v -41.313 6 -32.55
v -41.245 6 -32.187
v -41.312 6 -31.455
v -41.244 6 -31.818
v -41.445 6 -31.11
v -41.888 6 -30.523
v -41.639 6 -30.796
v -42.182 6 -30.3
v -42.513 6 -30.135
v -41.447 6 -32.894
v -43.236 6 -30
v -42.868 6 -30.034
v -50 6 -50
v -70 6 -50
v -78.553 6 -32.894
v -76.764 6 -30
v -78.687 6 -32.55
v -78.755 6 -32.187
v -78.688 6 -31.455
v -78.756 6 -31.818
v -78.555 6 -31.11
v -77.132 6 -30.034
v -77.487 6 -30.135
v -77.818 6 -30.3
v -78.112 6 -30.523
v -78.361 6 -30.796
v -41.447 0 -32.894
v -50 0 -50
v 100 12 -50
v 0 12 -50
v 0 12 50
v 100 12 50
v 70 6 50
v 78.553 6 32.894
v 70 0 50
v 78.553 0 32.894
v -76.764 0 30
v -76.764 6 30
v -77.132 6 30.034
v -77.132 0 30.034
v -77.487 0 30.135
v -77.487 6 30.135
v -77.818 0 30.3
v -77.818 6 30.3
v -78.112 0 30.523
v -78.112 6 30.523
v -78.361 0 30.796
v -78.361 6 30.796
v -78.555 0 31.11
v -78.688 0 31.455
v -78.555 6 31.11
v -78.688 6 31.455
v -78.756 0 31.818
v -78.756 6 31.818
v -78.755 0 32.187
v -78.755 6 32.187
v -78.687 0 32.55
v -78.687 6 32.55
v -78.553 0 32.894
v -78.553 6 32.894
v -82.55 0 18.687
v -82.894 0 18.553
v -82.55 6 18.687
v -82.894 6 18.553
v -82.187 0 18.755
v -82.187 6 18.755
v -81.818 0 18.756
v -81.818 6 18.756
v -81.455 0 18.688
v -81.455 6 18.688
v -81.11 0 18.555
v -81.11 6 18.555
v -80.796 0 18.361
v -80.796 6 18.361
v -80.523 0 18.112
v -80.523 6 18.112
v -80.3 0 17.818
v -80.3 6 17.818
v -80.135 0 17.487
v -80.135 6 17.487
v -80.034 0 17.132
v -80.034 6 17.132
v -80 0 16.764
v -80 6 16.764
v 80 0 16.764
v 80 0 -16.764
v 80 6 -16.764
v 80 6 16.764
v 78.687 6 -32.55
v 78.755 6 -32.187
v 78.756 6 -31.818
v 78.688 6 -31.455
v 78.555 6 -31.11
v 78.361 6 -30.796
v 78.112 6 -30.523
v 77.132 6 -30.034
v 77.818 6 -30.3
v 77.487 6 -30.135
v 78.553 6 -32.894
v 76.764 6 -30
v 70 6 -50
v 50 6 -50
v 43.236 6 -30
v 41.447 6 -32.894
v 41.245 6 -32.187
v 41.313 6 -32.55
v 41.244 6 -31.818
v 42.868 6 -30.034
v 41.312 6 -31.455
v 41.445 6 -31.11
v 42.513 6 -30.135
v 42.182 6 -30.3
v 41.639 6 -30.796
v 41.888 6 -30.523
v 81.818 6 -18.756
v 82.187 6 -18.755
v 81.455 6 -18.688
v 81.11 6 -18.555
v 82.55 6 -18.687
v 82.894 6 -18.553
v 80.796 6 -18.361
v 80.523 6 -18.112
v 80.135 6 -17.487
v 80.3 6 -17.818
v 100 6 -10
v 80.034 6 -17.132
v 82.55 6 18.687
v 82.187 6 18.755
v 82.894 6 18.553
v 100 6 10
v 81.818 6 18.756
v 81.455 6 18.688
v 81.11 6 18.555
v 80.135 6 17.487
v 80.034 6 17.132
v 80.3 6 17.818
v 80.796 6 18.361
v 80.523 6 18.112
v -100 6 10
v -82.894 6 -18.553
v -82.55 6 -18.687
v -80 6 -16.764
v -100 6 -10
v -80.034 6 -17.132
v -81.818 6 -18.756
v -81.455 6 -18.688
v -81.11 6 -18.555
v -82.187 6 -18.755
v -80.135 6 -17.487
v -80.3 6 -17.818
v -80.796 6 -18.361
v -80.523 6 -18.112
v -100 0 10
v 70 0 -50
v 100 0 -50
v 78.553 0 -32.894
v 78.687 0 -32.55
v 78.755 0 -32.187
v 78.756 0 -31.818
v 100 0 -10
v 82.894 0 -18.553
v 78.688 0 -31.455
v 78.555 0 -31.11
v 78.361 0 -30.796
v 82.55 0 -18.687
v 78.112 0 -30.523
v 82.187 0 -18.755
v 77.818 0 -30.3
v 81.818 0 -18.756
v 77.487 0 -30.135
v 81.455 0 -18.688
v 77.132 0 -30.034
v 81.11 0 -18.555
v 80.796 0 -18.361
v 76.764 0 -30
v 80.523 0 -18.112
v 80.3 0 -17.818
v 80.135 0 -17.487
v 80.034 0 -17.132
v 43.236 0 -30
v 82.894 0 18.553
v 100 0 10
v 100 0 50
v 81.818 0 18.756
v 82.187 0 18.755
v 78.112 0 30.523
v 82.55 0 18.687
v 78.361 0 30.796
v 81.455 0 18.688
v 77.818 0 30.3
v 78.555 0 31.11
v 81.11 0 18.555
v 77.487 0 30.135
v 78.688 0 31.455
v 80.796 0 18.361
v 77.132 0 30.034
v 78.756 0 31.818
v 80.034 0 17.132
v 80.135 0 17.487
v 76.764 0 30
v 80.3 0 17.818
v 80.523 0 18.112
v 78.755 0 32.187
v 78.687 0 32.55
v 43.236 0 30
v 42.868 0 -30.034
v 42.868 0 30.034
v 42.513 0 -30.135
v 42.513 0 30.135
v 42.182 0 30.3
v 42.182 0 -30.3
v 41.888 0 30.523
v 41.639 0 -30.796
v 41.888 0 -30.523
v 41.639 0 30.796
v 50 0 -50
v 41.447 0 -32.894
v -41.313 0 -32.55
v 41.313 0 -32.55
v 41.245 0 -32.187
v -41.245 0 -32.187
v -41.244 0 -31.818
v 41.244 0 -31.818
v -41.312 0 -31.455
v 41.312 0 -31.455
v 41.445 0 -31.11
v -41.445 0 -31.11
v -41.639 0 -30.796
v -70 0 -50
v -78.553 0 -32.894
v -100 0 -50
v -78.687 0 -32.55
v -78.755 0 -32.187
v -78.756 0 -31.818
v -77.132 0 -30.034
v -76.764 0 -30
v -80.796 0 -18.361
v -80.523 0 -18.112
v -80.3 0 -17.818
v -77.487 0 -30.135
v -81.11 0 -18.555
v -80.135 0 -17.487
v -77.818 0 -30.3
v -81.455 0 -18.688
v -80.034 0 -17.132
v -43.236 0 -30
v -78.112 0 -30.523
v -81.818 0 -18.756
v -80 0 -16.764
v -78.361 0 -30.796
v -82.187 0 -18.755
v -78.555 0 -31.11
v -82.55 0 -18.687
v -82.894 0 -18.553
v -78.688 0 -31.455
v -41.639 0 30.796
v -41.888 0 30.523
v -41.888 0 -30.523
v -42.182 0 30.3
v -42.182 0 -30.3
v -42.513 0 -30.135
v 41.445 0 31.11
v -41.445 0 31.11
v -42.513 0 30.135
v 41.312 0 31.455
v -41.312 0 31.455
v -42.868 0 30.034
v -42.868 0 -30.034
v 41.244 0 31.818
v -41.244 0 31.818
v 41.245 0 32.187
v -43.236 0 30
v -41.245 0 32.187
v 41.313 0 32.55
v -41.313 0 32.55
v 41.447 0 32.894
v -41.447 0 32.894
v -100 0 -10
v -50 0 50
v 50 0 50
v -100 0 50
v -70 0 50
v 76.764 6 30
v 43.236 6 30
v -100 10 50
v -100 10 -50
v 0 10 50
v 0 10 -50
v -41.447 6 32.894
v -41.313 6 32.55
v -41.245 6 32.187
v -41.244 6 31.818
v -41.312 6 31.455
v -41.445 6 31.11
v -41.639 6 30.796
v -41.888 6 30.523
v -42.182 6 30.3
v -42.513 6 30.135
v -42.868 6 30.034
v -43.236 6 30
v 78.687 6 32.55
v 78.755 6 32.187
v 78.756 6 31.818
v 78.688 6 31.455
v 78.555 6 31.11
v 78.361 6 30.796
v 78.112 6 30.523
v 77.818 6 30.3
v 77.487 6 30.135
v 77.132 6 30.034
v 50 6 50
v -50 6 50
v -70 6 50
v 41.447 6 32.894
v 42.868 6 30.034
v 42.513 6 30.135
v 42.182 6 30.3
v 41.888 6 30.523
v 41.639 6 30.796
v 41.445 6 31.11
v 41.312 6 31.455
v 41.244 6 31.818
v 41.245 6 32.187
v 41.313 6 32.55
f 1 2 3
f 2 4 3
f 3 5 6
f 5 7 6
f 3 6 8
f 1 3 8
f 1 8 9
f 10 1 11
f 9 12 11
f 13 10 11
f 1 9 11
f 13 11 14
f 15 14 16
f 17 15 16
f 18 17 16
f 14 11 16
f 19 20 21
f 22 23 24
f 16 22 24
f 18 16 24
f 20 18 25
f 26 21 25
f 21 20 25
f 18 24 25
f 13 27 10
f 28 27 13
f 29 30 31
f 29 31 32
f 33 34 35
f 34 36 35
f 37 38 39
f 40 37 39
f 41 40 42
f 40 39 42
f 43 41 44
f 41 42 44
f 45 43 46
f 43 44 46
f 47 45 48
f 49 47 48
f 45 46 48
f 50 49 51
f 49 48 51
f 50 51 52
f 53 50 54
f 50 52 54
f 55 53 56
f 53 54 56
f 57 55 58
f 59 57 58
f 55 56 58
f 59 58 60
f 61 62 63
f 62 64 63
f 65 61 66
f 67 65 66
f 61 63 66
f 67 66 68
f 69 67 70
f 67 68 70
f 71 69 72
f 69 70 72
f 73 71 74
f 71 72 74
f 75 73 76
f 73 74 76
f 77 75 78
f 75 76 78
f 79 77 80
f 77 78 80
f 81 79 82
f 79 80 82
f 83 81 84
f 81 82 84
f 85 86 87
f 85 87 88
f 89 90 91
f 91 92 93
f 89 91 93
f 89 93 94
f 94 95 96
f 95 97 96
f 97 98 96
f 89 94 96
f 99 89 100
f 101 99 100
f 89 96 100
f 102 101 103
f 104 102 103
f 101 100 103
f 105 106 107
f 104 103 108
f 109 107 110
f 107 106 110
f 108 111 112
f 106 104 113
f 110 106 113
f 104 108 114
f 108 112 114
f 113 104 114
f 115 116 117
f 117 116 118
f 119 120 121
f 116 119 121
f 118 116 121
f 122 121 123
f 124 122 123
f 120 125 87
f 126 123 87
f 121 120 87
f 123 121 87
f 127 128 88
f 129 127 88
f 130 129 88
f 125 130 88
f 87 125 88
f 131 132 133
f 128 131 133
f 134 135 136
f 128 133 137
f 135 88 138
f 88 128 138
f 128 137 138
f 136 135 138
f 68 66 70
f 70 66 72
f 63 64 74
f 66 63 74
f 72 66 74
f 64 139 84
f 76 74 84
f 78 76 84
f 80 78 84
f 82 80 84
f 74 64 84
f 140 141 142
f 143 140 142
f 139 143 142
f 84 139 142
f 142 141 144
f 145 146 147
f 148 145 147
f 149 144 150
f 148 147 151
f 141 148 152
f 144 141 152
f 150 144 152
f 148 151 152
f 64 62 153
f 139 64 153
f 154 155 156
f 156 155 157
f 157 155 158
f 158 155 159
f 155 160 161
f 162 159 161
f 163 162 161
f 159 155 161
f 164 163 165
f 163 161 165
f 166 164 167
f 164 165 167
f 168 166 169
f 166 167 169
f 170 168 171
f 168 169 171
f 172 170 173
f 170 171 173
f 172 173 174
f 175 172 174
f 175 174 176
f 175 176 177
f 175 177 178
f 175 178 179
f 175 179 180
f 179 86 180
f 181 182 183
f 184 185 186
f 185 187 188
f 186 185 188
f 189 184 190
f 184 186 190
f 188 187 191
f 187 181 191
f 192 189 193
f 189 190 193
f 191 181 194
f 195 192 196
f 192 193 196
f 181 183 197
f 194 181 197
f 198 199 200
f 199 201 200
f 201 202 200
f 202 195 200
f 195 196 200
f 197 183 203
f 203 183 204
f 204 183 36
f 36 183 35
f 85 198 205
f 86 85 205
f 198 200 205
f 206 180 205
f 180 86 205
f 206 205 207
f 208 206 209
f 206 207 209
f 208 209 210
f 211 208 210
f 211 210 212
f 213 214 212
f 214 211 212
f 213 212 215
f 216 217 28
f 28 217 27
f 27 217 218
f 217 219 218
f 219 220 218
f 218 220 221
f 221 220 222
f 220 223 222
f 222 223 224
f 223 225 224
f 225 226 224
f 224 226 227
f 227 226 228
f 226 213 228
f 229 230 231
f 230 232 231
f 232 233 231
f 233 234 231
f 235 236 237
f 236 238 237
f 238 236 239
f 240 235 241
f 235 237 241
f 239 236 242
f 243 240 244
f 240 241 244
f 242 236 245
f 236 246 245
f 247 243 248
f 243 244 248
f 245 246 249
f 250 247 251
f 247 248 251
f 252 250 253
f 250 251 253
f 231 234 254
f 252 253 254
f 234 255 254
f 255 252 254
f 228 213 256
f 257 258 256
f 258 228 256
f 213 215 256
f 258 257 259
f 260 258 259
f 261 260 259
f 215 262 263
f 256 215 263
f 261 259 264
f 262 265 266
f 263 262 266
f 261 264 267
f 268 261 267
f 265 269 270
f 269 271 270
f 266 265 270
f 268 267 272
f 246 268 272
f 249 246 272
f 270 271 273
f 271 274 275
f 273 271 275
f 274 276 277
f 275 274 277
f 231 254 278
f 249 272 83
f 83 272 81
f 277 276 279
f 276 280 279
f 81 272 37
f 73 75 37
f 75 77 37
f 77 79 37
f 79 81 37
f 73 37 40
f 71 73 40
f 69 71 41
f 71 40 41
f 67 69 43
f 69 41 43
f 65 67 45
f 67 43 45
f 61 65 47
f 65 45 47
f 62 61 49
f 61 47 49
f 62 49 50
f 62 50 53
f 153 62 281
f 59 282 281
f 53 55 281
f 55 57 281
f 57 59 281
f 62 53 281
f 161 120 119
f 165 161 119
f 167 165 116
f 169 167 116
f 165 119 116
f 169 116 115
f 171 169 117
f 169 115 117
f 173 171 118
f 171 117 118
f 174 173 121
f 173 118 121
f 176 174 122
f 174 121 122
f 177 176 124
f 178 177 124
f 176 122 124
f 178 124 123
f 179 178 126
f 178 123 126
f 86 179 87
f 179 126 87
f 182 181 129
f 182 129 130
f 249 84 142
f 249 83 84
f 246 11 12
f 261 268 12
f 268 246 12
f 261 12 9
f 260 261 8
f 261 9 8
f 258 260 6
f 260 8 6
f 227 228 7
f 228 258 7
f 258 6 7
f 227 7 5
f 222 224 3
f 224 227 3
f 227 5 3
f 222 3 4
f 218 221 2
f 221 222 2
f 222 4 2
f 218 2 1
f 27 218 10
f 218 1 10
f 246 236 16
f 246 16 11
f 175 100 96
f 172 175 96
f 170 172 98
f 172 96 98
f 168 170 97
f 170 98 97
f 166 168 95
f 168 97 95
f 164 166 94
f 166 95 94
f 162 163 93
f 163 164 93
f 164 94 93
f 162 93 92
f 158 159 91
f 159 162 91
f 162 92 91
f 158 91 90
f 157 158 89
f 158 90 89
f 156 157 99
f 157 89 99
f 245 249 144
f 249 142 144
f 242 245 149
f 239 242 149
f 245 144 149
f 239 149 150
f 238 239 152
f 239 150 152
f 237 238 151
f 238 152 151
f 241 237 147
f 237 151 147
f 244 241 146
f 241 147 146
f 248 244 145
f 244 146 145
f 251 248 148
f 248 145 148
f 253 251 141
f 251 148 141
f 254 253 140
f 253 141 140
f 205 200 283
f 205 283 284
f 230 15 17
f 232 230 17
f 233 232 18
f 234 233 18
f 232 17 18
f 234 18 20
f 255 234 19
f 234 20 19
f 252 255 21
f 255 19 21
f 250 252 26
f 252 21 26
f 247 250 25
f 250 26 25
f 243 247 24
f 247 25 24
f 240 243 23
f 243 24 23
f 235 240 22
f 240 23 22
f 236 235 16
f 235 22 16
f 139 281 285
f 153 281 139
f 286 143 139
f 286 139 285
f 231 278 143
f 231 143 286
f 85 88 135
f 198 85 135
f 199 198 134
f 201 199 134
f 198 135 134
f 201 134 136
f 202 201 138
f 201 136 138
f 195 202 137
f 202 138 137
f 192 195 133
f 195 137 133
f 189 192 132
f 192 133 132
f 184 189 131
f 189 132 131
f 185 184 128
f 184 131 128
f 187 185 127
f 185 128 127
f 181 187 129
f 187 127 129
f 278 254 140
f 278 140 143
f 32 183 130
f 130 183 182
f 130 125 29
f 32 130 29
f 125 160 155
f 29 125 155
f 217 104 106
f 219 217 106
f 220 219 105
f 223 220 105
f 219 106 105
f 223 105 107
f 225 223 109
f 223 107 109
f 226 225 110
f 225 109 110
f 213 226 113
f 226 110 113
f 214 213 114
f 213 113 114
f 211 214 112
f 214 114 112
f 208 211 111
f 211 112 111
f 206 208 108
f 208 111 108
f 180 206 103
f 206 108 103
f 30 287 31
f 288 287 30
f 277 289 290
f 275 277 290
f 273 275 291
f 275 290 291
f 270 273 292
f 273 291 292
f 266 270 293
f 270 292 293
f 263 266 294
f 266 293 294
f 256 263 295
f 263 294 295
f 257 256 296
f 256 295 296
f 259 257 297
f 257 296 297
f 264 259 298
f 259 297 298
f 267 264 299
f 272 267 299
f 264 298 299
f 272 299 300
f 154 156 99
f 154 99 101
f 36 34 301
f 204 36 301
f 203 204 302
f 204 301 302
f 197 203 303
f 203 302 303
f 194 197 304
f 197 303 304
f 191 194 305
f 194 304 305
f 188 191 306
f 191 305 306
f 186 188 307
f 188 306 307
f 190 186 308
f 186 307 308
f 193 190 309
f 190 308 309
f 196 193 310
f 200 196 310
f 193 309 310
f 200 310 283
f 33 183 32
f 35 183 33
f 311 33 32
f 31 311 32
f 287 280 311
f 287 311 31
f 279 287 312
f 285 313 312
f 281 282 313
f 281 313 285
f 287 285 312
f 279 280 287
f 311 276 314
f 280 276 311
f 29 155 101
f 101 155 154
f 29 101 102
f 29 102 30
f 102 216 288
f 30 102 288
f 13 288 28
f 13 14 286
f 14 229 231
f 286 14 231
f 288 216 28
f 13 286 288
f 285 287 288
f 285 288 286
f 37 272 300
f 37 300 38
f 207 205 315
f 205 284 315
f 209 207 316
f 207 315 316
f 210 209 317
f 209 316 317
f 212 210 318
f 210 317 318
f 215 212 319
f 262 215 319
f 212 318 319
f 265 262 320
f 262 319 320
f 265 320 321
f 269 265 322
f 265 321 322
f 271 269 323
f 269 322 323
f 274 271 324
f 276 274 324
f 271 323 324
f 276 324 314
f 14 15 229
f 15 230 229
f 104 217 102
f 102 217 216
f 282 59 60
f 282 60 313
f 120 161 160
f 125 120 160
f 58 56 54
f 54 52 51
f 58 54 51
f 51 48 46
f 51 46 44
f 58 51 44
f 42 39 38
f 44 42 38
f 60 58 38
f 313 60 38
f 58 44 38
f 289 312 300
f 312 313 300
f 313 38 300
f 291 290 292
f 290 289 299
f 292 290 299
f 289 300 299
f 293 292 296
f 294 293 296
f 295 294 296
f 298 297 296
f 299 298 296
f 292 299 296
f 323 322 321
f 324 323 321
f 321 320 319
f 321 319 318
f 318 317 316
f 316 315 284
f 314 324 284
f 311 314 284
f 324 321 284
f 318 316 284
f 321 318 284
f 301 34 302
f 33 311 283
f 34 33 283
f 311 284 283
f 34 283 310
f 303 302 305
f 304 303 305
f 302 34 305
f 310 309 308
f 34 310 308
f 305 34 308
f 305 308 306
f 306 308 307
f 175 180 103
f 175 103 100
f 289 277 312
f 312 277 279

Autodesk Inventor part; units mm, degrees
ref_plane "YZ Plane" through (0, 0, 0) normal (1, 0, 0) x (0, 1, 0)
ref_plane "XZ Plane" through (0, 0, 0) normal (0, 1, 0) x (-1, 0, 0)
ref_plane "XY Plane" through (0, 0, 0) normal (0, 0, 1) x (1, 0, 0)
sketch "Sketch1" plane through (0, 0, 0) normal (0, 1, 0) x (-1, 0, 0)
  line L0 (100, -50) -> (-100, -50)
  line L1 (-100, -50) -> (-100, 50)
  line L2 (-100, 50) -> (100, 50)
  line L3 (100, 50) -> (100, -50)
  line L4 (100, -50) -> (-100, 50) construction
  line L5 (-100, -50) -> (100, 50) construction
  line L6 (-40, -30) -> (-80, -30)
  line L7 (-50, -50) -> (-70, -50)
  line L8 (-40, -30) -> (-50, -50)
  line L9 (-80, -30) -> (-70, -50)
  line L10 (80, -30) -> (40, -30)
  line L11 (70, -50) -> (50, -50)
  line L12 (80, -30) -> (70, -50)
  line L13 (40, -30) -> (50, -50)
  line L14 (-100, -10) -> (-100, 10)
  line L15 (-80, -20) -> (-80, 20)
  line L16 (-80, -20) -> (-100, -10)
  line L17 (-80, 20) -> (-100, 10)
  point P0 (0, 0)
  point P1 (-100, 10)
  point P2 (-100, -10)
  point P3 (-70, -50)
  point P4 (-50, -50)
  point P5 (70, -50)
  point P6 (0, 0)
  point P7 (0, 0)
  dimension "d72" = 200
  dimension "d73" = 100
  dimension "d78" = 20
  dimension "d79" = 40
  dimension "d80" = 20
  dimension "d81" = 10
  dimension "d82" = 20
  dimension "d83" = 40
  dimension "d84" = 20
  dimension "d85" = 10
  dimension "d86" = 120
  dimension "d87" = 30
  dimension "d88" = 0
  dimension "d89" = 0
  dimension "d90" = 40
  dimension "d91" = 20
  dimension "d92" = 20
  dimension "d93" = 10
  dimension "d94" = 40
  dimension "d95" = 0
extrude "Extrusion17" add sketch "Sketch1" along normal blind 10
extrude "Extrusion18" cut sketch "Sketch1" along normal blind 6 contours L0 L13 L10 L12 | L0 L9 L6 L8 | L17 L15 L16 L1
pattern_circular "Circular Pattern5" count 2 over 360 about axis through (0, -10, 0) along (0, 1, 0) of "Extrusion18"
fillet "Fillet6" radius 2 12 edges at (80, 3, -30) (40, 3, -30) (-40, 3, -30) (-80, 3, -30) (-80, 3, -20) (-80, 3, 20) (-80, 3, 30) (-40, 3, 30) (40, 3, 30) (80, 3, 30) (80, 3, 20) (80, 3, -20)
sketch "Sketch5" plane through (0, 10, 0) normal (0, 1, 0) x (1, 0, 0)
  line L0 (100, -50) -> (100, -10) projected
  line L1 (100, 50) -> (-100, 50) projected
  line L2 (100, -50) -> (0, -50)
  line L3 (0, -50) -> (0, 50)
  line L4 (0, 50) -> (100, 50)
  line L5 (100, 50) -> (100, -50)
  point P0 (0, 0)
extrude "Extrusion19" add sketch "Sketch5" along normal blind 2
properties part number "Test2_3DPrint"
